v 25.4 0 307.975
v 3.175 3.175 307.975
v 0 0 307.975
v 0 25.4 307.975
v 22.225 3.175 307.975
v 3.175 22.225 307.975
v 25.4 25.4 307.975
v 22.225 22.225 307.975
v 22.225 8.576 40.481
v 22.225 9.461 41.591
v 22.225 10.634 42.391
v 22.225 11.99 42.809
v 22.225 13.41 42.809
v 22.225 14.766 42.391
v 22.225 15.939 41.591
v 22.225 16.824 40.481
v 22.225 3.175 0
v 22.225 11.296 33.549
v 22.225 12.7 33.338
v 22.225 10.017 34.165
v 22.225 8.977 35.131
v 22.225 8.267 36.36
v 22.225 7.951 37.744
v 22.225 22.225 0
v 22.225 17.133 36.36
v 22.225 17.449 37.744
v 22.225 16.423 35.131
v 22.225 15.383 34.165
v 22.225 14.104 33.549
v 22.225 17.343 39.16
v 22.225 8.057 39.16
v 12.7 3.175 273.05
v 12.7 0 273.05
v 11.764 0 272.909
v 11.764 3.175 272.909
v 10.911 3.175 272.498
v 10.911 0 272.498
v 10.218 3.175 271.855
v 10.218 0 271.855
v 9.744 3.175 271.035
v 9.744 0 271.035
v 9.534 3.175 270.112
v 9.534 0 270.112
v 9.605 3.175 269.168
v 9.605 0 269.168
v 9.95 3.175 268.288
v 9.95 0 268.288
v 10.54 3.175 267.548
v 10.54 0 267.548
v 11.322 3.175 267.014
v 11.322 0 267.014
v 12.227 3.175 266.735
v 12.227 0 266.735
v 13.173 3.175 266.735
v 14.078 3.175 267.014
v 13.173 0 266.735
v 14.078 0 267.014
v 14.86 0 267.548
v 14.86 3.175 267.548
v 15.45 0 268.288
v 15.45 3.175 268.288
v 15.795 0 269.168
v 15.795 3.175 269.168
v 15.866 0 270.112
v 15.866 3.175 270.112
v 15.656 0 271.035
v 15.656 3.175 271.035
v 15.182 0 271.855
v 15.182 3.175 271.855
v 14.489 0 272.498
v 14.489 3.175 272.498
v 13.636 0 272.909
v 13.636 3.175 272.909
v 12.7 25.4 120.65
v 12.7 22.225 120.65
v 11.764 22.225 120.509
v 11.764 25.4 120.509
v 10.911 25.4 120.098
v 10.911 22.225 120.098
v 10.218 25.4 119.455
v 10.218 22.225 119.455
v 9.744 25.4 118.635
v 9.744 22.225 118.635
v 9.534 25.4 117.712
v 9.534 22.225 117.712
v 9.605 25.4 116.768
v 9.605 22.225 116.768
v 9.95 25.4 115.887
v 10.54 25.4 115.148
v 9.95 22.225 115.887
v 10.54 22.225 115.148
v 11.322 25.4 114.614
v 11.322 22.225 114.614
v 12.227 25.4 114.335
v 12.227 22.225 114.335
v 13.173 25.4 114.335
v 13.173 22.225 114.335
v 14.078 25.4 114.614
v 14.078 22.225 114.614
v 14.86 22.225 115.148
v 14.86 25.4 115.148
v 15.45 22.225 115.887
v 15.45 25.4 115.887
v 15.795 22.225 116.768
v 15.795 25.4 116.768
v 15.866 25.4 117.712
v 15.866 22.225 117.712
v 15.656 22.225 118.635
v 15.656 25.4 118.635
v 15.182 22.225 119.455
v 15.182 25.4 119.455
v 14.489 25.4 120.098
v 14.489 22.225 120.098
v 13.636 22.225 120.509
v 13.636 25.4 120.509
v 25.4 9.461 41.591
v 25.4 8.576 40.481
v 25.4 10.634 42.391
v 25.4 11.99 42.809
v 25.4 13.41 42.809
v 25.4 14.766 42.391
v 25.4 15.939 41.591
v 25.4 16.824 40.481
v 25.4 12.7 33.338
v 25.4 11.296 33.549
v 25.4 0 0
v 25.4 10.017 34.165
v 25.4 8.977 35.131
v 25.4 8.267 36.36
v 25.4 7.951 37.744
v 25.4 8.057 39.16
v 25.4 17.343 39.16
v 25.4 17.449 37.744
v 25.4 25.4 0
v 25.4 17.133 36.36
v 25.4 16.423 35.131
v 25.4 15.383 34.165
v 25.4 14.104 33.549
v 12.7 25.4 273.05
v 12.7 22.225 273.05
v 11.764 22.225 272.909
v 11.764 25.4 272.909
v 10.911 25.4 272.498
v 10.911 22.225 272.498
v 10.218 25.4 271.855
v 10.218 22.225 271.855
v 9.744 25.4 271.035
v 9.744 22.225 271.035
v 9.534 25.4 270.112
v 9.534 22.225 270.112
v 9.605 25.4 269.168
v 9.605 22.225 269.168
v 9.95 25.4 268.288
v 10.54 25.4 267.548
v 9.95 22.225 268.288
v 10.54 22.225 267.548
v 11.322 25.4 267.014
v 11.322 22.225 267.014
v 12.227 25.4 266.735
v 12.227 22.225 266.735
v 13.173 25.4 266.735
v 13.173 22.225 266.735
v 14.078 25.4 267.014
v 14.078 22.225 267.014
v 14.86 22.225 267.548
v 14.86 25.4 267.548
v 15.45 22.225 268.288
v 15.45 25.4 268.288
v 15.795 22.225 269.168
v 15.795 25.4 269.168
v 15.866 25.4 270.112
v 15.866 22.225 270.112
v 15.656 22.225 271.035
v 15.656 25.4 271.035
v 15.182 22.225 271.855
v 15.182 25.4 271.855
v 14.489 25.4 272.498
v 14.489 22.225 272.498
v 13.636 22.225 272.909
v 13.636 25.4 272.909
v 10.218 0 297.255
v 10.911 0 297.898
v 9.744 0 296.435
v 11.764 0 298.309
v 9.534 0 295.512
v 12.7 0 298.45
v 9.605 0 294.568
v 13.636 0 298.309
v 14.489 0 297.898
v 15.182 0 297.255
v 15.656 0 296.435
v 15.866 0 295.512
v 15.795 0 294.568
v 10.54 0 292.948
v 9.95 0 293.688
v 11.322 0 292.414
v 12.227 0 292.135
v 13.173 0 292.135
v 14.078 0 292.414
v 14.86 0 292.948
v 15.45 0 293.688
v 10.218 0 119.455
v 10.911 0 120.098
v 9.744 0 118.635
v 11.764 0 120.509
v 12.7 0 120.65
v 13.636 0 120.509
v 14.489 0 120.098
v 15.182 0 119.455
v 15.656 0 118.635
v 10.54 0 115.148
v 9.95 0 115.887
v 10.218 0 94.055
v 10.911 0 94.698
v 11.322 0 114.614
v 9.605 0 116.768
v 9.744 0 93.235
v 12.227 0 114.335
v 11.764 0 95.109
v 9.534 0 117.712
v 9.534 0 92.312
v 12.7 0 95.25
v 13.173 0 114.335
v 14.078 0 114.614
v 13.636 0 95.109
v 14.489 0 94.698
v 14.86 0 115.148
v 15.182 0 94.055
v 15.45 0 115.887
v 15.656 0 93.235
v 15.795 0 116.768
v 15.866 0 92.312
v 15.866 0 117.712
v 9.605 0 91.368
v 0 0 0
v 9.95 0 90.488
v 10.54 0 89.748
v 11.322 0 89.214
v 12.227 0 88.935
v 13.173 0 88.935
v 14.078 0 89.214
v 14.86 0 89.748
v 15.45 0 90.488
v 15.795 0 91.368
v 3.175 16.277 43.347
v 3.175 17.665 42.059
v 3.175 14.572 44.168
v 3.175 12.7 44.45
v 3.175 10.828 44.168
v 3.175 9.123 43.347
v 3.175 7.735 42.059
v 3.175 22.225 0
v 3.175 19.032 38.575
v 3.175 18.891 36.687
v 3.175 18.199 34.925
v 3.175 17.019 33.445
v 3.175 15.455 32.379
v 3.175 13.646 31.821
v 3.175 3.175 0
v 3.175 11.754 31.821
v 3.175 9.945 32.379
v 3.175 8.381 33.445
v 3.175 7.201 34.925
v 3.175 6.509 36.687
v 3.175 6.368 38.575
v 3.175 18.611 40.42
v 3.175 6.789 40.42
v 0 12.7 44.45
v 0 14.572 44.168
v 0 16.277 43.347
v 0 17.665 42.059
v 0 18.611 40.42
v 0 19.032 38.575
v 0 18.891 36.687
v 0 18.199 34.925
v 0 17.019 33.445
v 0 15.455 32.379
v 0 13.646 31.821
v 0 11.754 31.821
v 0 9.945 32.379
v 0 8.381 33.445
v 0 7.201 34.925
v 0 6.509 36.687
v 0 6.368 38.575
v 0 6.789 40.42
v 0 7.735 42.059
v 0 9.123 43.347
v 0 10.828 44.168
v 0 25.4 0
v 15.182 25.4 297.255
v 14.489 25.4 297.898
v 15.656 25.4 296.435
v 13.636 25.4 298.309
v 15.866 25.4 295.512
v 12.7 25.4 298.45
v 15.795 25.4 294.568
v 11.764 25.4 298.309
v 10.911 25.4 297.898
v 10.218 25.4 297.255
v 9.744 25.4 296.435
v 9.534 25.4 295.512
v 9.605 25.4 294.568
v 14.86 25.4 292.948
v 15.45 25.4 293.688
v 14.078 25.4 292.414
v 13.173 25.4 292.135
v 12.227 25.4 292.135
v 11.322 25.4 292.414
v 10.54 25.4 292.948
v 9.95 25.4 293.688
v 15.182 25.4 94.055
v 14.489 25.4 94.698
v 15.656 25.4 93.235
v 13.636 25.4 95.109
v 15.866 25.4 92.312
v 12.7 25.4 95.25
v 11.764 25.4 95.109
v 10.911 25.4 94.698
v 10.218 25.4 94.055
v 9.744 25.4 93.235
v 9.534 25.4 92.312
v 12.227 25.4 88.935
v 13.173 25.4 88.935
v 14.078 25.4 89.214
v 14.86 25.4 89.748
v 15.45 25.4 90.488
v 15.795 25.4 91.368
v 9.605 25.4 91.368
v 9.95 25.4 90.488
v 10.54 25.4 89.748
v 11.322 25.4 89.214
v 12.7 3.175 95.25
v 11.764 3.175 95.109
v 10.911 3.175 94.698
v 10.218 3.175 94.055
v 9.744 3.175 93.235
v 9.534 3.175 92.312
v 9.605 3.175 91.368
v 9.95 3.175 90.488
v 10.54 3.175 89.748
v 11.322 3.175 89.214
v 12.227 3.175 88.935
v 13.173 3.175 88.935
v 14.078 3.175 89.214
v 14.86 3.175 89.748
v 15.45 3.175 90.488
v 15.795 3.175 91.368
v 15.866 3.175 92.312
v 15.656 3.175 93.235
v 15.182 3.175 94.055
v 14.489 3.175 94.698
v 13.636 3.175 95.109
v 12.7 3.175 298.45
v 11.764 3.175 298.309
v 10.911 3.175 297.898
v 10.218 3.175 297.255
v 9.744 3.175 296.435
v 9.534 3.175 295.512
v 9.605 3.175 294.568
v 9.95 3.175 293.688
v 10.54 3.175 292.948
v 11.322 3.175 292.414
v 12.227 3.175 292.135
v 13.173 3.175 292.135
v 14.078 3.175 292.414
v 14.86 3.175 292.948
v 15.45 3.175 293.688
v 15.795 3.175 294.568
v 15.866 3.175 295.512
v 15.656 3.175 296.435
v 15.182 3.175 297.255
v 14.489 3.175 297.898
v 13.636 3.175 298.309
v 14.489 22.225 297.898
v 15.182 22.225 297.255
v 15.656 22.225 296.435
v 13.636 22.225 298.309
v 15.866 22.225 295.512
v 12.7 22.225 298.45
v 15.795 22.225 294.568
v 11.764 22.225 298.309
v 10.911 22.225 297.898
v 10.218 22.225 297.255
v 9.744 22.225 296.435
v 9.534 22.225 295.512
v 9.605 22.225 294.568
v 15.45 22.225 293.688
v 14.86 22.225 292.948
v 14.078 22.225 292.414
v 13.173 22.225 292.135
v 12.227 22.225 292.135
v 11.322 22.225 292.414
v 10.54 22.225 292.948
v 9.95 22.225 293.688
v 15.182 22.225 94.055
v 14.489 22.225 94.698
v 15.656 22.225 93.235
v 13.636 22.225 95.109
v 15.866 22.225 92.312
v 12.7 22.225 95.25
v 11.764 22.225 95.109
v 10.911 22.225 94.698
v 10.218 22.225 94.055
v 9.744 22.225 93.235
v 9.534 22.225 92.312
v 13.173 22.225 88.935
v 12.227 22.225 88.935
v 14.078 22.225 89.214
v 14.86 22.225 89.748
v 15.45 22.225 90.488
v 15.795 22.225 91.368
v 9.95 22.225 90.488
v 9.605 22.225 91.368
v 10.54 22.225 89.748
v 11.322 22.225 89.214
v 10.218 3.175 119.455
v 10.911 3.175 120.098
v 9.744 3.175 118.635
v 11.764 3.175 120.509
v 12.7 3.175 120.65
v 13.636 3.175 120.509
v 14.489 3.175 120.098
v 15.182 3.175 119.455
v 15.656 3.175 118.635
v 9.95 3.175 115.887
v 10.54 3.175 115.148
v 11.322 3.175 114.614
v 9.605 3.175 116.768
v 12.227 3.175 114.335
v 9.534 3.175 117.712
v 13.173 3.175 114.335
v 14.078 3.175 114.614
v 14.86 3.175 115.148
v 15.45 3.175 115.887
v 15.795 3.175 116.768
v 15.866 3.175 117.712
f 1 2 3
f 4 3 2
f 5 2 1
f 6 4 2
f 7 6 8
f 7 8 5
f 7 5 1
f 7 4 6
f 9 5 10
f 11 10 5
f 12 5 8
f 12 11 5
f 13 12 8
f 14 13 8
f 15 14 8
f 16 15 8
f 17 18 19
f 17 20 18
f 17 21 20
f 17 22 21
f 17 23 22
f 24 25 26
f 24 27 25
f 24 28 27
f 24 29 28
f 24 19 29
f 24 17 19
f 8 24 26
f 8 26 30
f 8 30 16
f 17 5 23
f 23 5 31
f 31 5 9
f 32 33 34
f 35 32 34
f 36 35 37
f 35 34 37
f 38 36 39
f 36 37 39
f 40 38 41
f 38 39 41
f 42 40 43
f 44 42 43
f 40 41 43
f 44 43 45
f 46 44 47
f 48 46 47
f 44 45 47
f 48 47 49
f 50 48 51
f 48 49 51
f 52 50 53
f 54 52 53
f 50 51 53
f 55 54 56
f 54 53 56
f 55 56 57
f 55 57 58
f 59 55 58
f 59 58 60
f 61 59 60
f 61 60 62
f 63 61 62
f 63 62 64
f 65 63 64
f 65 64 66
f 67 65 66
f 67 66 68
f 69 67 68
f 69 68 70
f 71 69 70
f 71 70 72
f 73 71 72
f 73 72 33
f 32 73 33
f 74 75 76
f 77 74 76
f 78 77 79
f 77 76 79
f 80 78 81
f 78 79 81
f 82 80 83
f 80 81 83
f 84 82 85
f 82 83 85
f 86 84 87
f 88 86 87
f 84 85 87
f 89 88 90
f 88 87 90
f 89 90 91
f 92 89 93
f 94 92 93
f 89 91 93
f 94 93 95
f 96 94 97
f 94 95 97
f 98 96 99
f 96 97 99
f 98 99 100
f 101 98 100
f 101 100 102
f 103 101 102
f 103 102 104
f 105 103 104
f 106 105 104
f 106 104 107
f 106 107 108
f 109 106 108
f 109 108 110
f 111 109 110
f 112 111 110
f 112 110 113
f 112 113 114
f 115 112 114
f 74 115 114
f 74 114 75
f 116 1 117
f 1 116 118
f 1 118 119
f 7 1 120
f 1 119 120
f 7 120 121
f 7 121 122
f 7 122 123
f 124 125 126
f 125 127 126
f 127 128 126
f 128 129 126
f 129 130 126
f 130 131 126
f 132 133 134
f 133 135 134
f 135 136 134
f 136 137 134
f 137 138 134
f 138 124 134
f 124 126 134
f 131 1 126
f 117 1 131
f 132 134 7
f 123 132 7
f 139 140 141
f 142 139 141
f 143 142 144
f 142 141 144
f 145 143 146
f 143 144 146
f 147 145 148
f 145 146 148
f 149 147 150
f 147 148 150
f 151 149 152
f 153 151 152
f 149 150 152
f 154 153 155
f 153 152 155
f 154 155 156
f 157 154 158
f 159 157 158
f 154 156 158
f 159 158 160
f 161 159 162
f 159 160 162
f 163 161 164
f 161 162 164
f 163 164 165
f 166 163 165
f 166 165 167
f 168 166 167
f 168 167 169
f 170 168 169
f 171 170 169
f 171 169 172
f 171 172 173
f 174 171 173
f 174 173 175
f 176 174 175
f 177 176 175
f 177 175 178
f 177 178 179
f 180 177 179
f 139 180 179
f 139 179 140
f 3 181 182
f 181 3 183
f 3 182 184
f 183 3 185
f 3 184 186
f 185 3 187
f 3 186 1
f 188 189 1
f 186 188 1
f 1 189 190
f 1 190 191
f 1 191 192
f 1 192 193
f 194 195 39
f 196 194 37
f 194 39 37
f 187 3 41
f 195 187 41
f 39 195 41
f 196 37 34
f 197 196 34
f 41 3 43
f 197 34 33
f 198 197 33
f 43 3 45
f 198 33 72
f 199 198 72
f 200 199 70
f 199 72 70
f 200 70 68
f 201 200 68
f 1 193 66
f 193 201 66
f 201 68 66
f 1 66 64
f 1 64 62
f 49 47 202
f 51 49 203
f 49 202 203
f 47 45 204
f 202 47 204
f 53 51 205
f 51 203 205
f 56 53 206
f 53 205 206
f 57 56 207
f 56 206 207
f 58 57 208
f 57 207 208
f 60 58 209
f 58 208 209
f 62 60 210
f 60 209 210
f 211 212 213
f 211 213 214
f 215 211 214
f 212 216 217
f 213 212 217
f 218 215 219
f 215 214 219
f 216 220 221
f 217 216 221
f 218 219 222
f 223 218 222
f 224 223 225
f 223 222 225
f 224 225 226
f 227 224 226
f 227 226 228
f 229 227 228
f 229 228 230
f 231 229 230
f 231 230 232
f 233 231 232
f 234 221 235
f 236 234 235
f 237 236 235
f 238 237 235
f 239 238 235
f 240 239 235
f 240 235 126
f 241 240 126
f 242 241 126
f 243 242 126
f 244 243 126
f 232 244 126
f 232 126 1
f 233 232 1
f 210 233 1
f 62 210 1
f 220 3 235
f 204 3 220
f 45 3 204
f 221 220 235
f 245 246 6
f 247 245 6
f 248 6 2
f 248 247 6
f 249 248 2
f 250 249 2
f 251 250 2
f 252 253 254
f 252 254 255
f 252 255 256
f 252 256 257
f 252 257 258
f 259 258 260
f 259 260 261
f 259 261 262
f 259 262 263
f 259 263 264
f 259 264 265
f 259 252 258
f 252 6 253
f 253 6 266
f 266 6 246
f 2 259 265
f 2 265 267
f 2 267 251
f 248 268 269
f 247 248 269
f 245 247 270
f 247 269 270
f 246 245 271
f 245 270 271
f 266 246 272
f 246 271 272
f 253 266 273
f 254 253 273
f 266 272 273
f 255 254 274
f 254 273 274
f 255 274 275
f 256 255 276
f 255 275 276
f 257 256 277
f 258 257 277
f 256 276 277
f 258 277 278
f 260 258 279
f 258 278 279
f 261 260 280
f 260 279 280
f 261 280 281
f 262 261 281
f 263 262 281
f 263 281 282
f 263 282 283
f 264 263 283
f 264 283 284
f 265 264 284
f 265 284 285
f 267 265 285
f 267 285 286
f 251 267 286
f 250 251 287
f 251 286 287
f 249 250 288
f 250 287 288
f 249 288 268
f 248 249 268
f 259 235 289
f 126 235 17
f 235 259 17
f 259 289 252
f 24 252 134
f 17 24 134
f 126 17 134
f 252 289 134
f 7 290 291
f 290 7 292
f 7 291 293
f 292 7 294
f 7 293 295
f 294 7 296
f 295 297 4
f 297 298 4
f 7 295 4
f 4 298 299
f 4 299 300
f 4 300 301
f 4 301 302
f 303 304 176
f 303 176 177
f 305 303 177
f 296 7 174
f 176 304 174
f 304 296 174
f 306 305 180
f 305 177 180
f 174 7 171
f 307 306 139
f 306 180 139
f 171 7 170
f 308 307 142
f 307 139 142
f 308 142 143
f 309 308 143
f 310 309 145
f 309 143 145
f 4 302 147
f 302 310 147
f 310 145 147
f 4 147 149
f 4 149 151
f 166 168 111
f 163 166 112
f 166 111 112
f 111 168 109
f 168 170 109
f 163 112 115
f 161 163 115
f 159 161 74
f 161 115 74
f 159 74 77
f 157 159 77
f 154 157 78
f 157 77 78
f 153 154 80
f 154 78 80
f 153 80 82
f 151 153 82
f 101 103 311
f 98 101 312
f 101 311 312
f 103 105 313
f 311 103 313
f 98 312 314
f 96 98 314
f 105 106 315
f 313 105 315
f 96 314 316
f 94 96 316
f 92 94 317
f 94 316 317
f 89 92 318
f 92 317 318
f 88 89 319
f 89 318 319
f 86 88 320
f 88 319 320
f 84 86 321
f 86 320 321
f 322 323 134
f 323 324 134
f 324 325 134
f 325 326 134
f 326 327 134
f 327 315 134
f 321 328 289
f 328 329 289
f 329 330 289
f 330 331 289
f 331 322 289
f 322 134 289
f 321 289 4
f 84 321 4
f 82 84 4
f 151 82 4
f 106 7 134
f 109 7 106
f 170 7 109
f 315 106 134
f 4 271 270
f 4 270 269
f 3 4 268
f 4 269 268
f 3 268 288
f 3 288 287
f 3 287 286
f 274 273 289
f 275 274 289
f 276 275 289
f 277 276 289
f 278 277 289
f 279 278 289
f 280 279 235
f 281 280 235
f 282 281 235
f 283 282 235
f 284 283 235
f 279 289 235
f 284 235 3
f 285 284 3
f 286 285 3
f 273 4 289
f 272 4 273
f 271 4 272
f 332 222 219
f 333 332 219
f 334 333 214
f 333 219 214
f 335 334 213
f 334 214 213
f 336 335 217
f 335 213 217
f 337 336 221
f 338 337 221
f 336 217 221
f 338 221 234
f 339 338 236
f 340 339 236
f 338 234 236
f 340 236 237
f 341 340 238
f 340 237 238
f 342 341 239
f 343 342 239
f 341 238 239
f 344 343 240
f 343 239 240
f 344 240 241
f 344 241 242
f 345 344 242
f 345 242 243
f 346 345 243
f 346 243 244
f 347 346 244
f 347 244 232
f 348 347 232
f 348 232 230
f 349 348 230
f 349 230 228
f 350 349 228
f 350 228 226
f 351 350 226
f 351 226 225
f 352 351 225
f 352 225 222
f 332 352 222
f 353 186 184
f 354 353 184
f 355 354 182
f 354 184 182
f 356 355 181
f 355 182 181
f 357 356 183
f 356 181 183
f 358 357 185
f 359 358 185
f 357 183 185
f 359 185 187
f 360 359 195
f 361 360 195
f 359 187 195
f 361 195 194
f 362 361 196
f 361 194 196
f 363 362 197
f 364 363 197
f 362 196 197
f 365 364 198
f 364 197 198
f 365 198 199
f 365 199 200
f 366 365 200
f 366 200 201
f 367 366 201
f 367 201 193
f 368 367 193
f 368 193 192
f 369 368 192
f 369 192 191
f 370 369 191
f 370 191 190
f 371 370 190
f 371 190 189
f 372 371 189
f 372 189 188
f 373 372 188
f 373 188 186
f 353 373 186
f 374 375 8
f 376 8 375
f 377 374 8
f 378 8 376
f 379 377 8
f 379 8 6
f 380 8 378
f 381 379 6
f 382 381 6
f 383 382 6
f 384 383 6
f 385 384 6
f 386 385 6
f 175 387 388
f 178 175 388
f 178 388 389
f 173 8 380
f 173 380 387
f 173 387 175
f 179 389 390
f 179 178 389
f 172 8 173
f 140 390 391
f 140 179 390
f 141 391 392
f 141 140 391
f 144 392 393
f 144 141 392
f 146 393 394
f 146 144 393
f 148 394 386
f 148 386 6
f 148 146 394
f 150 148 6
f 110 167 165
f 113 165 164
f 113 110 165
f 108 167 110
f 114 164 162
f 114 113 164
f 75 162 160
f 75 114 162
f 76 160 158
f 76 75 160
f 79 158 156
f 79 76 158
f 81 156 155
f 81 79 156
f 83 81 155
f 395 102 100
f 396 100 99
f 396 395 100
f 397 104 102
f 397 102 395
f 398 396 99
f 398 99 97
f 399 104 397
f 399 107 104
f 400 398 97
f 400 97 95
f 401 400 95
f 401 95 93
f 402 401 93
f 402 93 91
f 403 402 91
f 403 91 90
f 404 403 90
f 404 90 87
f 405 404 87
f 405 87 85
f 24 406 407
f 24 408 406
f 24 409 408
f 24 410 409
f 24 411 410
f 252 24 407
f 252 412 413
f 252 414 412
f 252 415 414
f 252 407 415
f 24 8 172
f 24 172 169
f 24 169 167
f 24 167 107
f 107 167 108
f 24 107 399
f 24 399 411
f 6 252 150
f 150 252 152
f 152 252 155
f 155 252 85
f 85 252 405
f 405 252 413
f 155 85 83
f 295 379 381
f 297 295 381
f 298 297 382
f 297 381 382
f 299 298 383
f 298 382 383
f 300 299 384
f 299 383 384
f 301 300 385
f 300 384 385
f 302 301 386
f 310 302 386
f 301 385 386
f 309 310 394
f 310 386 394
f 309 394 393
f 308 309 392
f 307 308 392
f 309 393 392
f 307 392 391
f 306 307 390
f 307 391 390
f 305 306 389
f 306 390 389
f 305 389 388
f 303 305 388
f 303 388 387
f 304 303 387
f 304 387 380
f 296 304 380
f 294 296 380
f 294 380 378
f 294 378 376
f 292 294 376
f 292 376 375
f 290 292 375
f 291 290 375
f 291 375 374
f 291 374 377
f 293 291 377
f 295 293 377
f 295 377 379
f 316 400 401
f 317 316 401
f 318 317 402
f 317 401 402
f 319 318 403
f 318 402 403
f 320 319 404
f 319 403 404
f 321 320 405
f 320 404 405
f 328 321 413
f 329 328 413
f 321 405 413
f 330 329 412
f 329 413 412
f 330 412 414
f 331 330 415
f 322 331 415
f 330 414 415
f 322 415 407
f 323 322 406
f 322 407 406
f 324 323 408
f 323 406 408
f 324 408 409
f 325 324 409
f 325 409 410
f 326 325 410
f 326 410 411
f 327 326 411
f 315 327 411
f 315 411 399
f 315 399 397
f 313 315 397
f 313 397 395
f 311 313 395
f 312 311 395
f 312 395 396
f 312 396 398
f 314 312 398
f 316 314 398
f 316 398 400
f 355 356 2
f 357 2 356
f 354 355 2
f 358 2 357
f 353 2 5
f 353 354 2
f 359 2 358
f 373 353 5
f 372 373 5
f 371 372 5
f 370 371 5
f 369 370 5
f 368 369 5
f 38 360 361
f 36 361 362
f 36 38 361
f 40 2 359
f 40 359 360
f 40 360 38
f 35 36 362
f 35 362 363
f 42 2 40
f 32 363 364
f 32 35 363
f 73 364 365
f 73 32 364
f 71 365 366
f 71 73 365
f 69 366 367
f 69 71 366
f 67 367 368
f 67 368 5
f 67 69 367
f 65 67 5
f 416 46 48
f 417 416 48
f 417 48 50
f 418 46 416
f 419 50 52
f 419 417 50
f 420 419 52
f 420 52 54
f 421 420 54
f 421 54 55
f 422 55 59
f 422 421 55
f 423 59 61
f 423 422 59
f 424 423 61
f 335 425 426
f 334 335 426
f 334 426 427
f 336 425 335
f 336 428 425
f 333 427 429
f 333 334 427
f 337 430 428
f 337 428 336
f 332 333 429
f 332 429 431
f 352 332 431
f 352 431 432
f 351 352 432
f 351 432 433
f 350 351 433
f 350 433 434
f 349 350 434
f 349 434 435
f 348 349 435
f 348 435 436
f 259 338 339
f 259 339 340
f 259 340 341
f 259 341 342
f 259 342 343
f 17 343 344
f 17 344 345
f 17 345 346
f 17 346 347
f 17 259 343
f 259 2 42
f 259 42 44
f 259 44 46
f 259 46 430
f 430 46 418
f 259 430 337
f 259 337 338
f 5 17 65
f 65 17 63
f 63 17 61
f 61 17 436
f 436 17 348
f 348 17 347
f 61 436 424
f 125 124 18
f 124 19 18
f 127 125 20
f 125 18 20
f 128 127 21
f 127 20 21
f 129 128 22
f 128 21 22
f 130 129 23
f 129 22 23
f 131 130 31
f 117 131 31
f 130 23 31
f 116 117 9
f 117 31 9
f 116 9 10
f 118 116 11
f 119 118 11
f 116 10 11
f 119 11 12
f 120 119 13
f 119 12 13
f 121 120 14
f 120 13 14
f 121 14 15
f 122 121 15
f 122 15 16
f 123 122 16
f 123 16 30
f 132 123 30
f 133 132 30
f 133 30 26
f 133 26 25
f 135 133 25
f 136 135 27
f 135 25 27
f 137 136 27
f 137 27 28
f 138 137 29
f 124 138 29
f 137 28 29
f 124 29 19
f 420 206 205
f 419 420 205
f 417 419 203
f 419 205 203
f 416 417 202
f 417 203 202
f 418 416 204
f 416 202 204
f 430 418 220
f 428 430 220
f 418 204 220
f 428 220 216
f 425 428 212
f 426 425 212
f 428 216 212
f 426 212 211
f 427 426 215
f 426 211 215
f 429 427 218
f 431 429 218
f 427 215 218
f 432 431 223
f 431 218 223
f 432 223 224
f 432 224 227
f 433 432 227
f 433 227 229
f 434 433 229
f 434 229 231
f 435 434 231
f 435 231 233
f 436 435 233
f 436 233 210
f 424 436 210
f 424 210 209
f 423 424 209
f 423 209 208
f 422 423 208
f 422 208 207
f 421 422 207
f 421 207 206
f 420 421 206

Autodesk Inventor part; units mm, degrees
ref_plane "YZ Plane" through (0, 0, 0) normal (1, 0, 0) x (0, 1, 0)
ref_plane "XZ Plane" through (0, 0, 0) normal (0, 1, 0) x (-1, 0, 0)
ref_plane "XY Plane" through (0, 0, 0) normal (0, 0, 1) x (1, 0, 0)
sketch "Sketch1" plane through (0, 0, 0) normal (0, 0, 1) x (1, 0, 0)
  line L0 (0, 0) -> (25.4, 0)
  line L1 (25.4, 0) -> (25.4, 25.4)
  line L2 (25.4, 25.4) -> (0, 25.4)
  line L3 (0, 25.4) -> (0, 0)
  line L4 (3.175, 3.175) -> (22.225, 3.175)
  line L5 (22.225, 3.175) -> (22.225, 22.225)
  line L6 (22.225, 22.225) -> (3.175, 22.225)
  line L7 (3.175, 22.225) -> (3.175, 3.175)
  dimension "d0" = 25.4
  dimension "d1" = 25.4
  dimension "d2" = 19.05
  dimension "d3" = 19.05
  dimension "d4" = 3.175
  dimension "d5" = 3.175
extrude "Extrusion1" add sketch "Sketch1" along normal blind 307.975
sketch "Sketch2" plane through (0, 25.4, 0) normal (0, 1, 0) x (1, 0, 0)
  line L0 (25.4, -307.975) -> (0, -307.975) projected
  line L1 (25.4, 0) -> (25.4, -307.975) projected
  point P0 (12.7, -295.275)
  point P1 (12.7, -269.875)
  point P2 (12.7, -117.475)
  point P3 (12.7, -92.075)
  dimension "d8" = 12.7
  dimension "d9" = 12.7
  dimension "d11" = 12.7
  dimension "d16" = 12.7
  dimension "d17" = 12.7
  dimension "d34" = 152.4
  dimension "d35" = 25.4
  dimension "d36" = 25.4
hole "Hole1" at (12.7, 25.4, 295.275) at (12.7, 25.4, 269.875) at (12.7, 25.4, 117.475) at (12.7, 25.4, 92.075) direction (0, -1, 0) diameter 6.35 end through all
sketch "Sketch3" plane through (25.4, 0, 0) normal (1, 0, 0) x (0, 0, -1)
  line L0 (0, 0) -> (0, 25.4) projected
  line L1 (0, 0) -> (-307.975, 0) projected
  point P0 (-38.1, 12.7)
  dimension "d25" = 38.1
  dimension "d26" = 12.7
hole "Hole2" at (25.4, 12.7, 38.1) direction (-1, 0, 0) diameter 9.525 end through all
sketch "Sketch4" plane through (0, 0, 0) normal (-1, 0, 0) x (0, 0, 1)
  circle A0 centre (38.1, 12.7) radius 4.7625 projected
  circle A1 centre (38.1, 12.7) radius 6.35
  dimension "d37" = 12.7
extrude "Extrusion2" cut sketch "Sketch4" against normal blind 12.7
properties part number "1x1 lengthwise" material "Aluminum 6061"
